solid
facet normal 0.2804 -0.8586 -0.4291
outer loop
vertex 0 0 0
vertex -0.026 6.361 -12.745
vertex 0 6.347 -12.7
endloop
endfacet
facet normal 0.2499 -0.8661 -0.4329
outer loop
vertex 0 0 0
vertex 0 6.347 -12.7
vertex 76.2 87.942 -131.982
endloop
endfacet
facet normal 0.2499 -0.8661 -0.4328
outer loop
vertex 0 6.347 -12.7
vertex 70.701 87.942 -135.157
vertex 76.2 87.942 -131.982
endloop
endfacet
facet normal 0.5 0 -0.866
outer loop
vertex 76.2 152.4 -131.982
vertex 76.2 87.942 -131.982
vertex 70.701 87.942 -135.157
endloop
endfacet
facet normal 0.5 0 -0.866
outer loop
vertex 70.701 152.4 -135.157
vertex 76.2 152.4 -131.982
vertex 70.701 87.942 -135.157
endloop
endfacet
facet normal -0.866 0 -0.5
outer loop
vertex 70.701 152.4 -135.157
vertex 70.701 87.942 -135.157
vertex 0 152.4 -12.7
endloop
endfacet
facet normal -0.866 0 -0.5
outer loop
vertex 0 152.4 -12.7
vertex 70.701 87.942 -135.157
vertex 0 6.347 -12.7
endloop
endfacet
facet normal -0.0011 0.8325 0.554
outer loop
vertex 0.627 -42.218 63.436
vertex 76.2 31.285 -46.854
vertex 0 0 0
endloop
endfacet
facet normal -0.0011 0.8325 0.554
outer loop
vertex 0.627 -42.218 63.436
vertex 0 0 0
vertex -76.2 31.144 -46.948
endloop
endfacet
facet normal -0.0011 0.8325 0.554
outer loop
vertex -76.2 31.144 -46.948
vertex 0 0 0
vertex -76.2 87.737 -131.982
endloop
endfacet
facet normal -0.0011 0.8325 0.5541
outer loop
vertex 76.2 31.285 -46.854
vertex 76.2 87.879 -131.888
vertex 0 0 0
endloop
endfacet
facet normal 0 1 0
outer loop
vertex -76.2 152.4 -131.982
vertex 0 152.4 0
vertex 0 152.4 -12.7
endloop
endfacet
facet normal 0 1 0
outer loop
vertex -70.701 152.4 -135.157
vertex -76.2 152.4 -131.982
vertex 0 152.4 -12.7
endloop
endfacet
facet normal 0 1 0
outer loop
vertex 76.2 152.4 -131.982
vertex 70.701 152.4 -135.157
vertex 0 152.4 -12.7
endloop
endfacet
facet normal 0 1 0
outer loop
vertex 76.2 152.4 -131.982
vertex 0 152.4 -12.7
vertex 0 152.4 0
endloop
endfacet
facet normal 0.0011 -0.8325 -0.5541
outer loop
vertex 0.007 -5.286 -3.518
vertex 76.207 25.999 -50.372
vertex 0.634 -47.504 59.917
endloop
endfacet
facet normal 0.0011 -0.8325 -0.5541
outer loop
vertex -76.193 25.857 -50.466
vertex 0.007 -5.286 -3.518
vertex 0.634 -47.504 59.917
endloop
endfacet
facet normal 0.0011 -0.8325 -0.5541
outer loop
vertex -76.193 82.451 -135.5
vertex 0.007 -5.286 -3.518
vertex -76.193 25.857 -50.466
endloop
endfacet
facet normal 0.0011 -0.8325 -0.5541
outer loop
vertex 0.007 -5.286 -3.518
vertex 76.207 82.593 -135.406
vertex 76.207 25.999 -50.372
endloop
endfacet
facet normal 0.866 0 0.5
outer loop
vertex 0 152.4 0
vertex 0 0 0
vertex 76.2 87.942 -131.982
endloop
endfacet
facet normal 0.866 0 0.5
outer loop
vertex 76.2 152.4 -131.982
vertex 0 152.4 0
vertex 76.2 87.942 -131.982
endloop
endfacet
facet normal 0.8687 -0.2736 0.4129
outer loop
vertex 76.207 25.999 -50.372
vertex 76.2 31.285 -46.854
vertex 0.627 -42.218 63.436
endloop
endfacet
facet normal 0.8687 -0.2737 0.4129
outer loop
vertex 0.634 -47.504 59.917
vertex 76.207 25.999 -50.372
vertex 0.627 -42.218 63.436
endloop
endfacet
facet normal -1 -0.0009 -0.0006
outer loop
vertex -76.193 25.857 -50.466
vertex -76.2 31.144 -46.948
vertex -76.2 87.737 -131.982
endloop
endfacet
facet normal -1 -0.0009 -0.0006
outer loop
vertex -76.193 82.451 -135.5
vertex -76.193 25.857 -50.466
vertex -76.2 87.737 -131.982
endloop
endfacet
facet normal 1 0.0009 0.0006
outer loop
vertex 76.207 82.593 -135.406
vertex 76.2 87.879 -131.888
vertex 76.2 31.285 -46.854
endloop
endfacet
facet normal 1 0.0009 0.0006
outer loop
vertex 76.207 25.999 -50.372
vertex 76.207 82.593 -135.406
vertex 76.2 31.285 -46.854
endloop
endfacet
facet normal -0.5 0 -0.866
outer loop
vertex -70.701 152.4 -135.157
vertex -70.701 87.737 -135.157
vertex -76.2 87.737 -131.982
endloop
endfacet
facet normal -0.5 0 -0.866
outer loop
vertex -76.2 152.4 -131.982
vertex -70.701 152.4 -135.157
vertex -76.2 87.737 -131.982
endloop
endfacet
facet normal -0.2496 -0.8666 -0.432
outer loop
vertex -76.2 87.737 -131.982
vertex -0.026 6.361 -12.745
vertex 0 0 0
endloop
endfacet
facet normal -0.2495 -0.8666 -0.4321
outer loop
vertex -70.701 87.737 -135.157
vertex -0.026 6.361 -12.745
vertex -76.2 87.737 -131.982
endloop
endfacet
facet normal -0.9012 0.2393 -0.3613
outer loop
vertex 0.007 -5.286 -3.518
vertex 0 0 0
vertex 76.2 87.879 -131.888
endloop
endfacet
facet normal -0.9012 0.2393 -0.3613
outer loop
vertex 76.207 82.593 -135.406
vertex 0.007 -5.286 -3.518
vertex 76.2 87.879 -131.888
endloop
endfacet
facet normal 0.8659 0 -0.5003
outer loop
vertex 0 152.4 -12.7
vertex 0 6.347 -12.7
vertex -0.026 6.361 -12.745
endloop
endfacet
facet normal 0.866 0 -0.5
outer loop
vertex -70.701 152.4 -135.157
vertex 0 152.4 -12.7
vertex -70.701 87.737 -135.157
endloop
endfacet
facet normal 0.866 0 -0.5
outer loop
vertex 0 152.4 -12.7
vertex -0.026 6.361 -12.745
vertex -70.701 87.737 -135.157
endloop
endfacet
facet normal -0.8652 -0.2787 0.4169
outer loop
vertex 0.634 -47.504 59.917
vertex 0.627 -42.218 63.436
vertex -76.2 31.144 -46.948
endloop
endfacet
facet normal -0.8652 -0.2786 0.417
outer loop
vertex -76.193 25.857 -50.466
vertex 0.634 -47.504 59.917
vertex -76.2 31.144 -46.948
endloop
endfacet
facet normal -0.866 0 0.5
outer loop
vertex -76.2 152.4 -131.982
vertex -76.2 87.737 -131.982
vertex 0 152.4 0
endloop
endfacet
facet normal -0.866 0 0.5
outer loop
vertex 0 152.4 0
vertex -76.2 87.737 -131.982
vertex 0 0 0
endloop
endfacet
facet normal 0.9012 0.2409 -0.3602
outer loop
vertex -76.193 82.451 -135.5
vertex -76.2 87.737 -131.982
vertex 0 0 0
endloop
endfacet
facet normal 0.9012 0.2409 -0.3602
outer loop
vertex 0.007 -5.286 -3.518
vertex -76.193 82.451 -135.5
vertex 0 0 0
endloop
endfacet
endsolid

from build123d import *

# Parameters (mm, degrees)
EXTRUDE_THIN1_DEPTH     = 152.4
CUT_EXTRUDE1_DEPTH      = 218.484914533
CUT_EXTRUDE1_DEPTH_BACK = 218.484914533
CUT_EXTRUDE3_DEPTH      = 218.484914533
CUT_EXTRUDE3_DEPTH_BACK = 218.484914533
BOSS_EXTRUDE1_DEPTH     = 6.35


with BuildPart() as part:
    # Sketch1 → Extrude-Thin1 (new body)
    with BuildSketch(Plane(origin=(0, 0, 0), x_dir=(1, 0, 0), z_dir=(0, 1, 0))):
        Polygon((-76.2, 131.982271537), (0, 0), (76.2, 131.982271537), (70.700738686, 135.157271537), (0, 12.7), (-70.700738686, 135.157271537), align=None)
    extrude(amount=EXTRUDE_THIN1_DEPTH)

    # Sketch3 → Cut-Extrude1 (cut, two sides: drawn at the far end of the back side and taken through both)
    with BuildSketch(Plane(origin=(0, 0, 0), x_dir=(0.5000000000000046, 0, 0.8660254037844362), z_dir=(-0.8660254037844362, 0, 0.5000000000000046)).offset(-CUT_EXTRUDE1_DEPTH_BACK)):
        Polygon((385.619920401, -222.002507612), (0, 0), (-152.4, 87.73712241), (-538.019920401, 309.739630022), (-982.024935624, -461.500210779), (-58.385094823, -993.242348413), align=None)
    extrude(amount=CUT_EXTRUDE1_DEPTH + CUT_EXTRUDE1_DEPTH_BACK, mode=Mode.SUBTRACT)

    # Sketch2 → Cut-Extrude3 (cut, two sides: drawn at the far end of the back side and taken through both)
    with BuildSketch(Plane(origin=(0, 0, 0), x_dir=(0.49999999999999806, 0, -0.8660254037844397), z_dir=(0.8660254037844397, 0, 0.49999999999999806)).offset(-CUT_EXTRUDE3_DEPTH_BACK)):
        Polygon((152.4, 87.941634884), (0, 0), (152.4, 0), align=None)
    extrude(amount=CUT_EXTRUDE3_DEPTH + CUT_EXTRUDE3_DEPTH_BACK, mode=Mode.SUBTRACT)


with BuildPart() as body_2:
    # Sketch6 → Boss-Extrude1 (new body)
    with BuildSketch(Plane(origin=(0, 0, 0), x_dir=(-0.9999993759918608, -0.0009300055725387003, -0.0006189551875342996), z_dir=(0.0011171463150047337, -0.8324827103813286, -0.5540498974824092))):
        Polygon((-0.626924241, -76.2), (76.200047549, 56.338584839), (76.200047549, 158.483801703), (0, 0), (-76.200047549, 158.483801703), (-76.200047549, 56.338584839), align=None)
    extrude(amount=BOSS_EXTRUDE1_DEPTH)


solid = Compound([part.part, body_2.part])
